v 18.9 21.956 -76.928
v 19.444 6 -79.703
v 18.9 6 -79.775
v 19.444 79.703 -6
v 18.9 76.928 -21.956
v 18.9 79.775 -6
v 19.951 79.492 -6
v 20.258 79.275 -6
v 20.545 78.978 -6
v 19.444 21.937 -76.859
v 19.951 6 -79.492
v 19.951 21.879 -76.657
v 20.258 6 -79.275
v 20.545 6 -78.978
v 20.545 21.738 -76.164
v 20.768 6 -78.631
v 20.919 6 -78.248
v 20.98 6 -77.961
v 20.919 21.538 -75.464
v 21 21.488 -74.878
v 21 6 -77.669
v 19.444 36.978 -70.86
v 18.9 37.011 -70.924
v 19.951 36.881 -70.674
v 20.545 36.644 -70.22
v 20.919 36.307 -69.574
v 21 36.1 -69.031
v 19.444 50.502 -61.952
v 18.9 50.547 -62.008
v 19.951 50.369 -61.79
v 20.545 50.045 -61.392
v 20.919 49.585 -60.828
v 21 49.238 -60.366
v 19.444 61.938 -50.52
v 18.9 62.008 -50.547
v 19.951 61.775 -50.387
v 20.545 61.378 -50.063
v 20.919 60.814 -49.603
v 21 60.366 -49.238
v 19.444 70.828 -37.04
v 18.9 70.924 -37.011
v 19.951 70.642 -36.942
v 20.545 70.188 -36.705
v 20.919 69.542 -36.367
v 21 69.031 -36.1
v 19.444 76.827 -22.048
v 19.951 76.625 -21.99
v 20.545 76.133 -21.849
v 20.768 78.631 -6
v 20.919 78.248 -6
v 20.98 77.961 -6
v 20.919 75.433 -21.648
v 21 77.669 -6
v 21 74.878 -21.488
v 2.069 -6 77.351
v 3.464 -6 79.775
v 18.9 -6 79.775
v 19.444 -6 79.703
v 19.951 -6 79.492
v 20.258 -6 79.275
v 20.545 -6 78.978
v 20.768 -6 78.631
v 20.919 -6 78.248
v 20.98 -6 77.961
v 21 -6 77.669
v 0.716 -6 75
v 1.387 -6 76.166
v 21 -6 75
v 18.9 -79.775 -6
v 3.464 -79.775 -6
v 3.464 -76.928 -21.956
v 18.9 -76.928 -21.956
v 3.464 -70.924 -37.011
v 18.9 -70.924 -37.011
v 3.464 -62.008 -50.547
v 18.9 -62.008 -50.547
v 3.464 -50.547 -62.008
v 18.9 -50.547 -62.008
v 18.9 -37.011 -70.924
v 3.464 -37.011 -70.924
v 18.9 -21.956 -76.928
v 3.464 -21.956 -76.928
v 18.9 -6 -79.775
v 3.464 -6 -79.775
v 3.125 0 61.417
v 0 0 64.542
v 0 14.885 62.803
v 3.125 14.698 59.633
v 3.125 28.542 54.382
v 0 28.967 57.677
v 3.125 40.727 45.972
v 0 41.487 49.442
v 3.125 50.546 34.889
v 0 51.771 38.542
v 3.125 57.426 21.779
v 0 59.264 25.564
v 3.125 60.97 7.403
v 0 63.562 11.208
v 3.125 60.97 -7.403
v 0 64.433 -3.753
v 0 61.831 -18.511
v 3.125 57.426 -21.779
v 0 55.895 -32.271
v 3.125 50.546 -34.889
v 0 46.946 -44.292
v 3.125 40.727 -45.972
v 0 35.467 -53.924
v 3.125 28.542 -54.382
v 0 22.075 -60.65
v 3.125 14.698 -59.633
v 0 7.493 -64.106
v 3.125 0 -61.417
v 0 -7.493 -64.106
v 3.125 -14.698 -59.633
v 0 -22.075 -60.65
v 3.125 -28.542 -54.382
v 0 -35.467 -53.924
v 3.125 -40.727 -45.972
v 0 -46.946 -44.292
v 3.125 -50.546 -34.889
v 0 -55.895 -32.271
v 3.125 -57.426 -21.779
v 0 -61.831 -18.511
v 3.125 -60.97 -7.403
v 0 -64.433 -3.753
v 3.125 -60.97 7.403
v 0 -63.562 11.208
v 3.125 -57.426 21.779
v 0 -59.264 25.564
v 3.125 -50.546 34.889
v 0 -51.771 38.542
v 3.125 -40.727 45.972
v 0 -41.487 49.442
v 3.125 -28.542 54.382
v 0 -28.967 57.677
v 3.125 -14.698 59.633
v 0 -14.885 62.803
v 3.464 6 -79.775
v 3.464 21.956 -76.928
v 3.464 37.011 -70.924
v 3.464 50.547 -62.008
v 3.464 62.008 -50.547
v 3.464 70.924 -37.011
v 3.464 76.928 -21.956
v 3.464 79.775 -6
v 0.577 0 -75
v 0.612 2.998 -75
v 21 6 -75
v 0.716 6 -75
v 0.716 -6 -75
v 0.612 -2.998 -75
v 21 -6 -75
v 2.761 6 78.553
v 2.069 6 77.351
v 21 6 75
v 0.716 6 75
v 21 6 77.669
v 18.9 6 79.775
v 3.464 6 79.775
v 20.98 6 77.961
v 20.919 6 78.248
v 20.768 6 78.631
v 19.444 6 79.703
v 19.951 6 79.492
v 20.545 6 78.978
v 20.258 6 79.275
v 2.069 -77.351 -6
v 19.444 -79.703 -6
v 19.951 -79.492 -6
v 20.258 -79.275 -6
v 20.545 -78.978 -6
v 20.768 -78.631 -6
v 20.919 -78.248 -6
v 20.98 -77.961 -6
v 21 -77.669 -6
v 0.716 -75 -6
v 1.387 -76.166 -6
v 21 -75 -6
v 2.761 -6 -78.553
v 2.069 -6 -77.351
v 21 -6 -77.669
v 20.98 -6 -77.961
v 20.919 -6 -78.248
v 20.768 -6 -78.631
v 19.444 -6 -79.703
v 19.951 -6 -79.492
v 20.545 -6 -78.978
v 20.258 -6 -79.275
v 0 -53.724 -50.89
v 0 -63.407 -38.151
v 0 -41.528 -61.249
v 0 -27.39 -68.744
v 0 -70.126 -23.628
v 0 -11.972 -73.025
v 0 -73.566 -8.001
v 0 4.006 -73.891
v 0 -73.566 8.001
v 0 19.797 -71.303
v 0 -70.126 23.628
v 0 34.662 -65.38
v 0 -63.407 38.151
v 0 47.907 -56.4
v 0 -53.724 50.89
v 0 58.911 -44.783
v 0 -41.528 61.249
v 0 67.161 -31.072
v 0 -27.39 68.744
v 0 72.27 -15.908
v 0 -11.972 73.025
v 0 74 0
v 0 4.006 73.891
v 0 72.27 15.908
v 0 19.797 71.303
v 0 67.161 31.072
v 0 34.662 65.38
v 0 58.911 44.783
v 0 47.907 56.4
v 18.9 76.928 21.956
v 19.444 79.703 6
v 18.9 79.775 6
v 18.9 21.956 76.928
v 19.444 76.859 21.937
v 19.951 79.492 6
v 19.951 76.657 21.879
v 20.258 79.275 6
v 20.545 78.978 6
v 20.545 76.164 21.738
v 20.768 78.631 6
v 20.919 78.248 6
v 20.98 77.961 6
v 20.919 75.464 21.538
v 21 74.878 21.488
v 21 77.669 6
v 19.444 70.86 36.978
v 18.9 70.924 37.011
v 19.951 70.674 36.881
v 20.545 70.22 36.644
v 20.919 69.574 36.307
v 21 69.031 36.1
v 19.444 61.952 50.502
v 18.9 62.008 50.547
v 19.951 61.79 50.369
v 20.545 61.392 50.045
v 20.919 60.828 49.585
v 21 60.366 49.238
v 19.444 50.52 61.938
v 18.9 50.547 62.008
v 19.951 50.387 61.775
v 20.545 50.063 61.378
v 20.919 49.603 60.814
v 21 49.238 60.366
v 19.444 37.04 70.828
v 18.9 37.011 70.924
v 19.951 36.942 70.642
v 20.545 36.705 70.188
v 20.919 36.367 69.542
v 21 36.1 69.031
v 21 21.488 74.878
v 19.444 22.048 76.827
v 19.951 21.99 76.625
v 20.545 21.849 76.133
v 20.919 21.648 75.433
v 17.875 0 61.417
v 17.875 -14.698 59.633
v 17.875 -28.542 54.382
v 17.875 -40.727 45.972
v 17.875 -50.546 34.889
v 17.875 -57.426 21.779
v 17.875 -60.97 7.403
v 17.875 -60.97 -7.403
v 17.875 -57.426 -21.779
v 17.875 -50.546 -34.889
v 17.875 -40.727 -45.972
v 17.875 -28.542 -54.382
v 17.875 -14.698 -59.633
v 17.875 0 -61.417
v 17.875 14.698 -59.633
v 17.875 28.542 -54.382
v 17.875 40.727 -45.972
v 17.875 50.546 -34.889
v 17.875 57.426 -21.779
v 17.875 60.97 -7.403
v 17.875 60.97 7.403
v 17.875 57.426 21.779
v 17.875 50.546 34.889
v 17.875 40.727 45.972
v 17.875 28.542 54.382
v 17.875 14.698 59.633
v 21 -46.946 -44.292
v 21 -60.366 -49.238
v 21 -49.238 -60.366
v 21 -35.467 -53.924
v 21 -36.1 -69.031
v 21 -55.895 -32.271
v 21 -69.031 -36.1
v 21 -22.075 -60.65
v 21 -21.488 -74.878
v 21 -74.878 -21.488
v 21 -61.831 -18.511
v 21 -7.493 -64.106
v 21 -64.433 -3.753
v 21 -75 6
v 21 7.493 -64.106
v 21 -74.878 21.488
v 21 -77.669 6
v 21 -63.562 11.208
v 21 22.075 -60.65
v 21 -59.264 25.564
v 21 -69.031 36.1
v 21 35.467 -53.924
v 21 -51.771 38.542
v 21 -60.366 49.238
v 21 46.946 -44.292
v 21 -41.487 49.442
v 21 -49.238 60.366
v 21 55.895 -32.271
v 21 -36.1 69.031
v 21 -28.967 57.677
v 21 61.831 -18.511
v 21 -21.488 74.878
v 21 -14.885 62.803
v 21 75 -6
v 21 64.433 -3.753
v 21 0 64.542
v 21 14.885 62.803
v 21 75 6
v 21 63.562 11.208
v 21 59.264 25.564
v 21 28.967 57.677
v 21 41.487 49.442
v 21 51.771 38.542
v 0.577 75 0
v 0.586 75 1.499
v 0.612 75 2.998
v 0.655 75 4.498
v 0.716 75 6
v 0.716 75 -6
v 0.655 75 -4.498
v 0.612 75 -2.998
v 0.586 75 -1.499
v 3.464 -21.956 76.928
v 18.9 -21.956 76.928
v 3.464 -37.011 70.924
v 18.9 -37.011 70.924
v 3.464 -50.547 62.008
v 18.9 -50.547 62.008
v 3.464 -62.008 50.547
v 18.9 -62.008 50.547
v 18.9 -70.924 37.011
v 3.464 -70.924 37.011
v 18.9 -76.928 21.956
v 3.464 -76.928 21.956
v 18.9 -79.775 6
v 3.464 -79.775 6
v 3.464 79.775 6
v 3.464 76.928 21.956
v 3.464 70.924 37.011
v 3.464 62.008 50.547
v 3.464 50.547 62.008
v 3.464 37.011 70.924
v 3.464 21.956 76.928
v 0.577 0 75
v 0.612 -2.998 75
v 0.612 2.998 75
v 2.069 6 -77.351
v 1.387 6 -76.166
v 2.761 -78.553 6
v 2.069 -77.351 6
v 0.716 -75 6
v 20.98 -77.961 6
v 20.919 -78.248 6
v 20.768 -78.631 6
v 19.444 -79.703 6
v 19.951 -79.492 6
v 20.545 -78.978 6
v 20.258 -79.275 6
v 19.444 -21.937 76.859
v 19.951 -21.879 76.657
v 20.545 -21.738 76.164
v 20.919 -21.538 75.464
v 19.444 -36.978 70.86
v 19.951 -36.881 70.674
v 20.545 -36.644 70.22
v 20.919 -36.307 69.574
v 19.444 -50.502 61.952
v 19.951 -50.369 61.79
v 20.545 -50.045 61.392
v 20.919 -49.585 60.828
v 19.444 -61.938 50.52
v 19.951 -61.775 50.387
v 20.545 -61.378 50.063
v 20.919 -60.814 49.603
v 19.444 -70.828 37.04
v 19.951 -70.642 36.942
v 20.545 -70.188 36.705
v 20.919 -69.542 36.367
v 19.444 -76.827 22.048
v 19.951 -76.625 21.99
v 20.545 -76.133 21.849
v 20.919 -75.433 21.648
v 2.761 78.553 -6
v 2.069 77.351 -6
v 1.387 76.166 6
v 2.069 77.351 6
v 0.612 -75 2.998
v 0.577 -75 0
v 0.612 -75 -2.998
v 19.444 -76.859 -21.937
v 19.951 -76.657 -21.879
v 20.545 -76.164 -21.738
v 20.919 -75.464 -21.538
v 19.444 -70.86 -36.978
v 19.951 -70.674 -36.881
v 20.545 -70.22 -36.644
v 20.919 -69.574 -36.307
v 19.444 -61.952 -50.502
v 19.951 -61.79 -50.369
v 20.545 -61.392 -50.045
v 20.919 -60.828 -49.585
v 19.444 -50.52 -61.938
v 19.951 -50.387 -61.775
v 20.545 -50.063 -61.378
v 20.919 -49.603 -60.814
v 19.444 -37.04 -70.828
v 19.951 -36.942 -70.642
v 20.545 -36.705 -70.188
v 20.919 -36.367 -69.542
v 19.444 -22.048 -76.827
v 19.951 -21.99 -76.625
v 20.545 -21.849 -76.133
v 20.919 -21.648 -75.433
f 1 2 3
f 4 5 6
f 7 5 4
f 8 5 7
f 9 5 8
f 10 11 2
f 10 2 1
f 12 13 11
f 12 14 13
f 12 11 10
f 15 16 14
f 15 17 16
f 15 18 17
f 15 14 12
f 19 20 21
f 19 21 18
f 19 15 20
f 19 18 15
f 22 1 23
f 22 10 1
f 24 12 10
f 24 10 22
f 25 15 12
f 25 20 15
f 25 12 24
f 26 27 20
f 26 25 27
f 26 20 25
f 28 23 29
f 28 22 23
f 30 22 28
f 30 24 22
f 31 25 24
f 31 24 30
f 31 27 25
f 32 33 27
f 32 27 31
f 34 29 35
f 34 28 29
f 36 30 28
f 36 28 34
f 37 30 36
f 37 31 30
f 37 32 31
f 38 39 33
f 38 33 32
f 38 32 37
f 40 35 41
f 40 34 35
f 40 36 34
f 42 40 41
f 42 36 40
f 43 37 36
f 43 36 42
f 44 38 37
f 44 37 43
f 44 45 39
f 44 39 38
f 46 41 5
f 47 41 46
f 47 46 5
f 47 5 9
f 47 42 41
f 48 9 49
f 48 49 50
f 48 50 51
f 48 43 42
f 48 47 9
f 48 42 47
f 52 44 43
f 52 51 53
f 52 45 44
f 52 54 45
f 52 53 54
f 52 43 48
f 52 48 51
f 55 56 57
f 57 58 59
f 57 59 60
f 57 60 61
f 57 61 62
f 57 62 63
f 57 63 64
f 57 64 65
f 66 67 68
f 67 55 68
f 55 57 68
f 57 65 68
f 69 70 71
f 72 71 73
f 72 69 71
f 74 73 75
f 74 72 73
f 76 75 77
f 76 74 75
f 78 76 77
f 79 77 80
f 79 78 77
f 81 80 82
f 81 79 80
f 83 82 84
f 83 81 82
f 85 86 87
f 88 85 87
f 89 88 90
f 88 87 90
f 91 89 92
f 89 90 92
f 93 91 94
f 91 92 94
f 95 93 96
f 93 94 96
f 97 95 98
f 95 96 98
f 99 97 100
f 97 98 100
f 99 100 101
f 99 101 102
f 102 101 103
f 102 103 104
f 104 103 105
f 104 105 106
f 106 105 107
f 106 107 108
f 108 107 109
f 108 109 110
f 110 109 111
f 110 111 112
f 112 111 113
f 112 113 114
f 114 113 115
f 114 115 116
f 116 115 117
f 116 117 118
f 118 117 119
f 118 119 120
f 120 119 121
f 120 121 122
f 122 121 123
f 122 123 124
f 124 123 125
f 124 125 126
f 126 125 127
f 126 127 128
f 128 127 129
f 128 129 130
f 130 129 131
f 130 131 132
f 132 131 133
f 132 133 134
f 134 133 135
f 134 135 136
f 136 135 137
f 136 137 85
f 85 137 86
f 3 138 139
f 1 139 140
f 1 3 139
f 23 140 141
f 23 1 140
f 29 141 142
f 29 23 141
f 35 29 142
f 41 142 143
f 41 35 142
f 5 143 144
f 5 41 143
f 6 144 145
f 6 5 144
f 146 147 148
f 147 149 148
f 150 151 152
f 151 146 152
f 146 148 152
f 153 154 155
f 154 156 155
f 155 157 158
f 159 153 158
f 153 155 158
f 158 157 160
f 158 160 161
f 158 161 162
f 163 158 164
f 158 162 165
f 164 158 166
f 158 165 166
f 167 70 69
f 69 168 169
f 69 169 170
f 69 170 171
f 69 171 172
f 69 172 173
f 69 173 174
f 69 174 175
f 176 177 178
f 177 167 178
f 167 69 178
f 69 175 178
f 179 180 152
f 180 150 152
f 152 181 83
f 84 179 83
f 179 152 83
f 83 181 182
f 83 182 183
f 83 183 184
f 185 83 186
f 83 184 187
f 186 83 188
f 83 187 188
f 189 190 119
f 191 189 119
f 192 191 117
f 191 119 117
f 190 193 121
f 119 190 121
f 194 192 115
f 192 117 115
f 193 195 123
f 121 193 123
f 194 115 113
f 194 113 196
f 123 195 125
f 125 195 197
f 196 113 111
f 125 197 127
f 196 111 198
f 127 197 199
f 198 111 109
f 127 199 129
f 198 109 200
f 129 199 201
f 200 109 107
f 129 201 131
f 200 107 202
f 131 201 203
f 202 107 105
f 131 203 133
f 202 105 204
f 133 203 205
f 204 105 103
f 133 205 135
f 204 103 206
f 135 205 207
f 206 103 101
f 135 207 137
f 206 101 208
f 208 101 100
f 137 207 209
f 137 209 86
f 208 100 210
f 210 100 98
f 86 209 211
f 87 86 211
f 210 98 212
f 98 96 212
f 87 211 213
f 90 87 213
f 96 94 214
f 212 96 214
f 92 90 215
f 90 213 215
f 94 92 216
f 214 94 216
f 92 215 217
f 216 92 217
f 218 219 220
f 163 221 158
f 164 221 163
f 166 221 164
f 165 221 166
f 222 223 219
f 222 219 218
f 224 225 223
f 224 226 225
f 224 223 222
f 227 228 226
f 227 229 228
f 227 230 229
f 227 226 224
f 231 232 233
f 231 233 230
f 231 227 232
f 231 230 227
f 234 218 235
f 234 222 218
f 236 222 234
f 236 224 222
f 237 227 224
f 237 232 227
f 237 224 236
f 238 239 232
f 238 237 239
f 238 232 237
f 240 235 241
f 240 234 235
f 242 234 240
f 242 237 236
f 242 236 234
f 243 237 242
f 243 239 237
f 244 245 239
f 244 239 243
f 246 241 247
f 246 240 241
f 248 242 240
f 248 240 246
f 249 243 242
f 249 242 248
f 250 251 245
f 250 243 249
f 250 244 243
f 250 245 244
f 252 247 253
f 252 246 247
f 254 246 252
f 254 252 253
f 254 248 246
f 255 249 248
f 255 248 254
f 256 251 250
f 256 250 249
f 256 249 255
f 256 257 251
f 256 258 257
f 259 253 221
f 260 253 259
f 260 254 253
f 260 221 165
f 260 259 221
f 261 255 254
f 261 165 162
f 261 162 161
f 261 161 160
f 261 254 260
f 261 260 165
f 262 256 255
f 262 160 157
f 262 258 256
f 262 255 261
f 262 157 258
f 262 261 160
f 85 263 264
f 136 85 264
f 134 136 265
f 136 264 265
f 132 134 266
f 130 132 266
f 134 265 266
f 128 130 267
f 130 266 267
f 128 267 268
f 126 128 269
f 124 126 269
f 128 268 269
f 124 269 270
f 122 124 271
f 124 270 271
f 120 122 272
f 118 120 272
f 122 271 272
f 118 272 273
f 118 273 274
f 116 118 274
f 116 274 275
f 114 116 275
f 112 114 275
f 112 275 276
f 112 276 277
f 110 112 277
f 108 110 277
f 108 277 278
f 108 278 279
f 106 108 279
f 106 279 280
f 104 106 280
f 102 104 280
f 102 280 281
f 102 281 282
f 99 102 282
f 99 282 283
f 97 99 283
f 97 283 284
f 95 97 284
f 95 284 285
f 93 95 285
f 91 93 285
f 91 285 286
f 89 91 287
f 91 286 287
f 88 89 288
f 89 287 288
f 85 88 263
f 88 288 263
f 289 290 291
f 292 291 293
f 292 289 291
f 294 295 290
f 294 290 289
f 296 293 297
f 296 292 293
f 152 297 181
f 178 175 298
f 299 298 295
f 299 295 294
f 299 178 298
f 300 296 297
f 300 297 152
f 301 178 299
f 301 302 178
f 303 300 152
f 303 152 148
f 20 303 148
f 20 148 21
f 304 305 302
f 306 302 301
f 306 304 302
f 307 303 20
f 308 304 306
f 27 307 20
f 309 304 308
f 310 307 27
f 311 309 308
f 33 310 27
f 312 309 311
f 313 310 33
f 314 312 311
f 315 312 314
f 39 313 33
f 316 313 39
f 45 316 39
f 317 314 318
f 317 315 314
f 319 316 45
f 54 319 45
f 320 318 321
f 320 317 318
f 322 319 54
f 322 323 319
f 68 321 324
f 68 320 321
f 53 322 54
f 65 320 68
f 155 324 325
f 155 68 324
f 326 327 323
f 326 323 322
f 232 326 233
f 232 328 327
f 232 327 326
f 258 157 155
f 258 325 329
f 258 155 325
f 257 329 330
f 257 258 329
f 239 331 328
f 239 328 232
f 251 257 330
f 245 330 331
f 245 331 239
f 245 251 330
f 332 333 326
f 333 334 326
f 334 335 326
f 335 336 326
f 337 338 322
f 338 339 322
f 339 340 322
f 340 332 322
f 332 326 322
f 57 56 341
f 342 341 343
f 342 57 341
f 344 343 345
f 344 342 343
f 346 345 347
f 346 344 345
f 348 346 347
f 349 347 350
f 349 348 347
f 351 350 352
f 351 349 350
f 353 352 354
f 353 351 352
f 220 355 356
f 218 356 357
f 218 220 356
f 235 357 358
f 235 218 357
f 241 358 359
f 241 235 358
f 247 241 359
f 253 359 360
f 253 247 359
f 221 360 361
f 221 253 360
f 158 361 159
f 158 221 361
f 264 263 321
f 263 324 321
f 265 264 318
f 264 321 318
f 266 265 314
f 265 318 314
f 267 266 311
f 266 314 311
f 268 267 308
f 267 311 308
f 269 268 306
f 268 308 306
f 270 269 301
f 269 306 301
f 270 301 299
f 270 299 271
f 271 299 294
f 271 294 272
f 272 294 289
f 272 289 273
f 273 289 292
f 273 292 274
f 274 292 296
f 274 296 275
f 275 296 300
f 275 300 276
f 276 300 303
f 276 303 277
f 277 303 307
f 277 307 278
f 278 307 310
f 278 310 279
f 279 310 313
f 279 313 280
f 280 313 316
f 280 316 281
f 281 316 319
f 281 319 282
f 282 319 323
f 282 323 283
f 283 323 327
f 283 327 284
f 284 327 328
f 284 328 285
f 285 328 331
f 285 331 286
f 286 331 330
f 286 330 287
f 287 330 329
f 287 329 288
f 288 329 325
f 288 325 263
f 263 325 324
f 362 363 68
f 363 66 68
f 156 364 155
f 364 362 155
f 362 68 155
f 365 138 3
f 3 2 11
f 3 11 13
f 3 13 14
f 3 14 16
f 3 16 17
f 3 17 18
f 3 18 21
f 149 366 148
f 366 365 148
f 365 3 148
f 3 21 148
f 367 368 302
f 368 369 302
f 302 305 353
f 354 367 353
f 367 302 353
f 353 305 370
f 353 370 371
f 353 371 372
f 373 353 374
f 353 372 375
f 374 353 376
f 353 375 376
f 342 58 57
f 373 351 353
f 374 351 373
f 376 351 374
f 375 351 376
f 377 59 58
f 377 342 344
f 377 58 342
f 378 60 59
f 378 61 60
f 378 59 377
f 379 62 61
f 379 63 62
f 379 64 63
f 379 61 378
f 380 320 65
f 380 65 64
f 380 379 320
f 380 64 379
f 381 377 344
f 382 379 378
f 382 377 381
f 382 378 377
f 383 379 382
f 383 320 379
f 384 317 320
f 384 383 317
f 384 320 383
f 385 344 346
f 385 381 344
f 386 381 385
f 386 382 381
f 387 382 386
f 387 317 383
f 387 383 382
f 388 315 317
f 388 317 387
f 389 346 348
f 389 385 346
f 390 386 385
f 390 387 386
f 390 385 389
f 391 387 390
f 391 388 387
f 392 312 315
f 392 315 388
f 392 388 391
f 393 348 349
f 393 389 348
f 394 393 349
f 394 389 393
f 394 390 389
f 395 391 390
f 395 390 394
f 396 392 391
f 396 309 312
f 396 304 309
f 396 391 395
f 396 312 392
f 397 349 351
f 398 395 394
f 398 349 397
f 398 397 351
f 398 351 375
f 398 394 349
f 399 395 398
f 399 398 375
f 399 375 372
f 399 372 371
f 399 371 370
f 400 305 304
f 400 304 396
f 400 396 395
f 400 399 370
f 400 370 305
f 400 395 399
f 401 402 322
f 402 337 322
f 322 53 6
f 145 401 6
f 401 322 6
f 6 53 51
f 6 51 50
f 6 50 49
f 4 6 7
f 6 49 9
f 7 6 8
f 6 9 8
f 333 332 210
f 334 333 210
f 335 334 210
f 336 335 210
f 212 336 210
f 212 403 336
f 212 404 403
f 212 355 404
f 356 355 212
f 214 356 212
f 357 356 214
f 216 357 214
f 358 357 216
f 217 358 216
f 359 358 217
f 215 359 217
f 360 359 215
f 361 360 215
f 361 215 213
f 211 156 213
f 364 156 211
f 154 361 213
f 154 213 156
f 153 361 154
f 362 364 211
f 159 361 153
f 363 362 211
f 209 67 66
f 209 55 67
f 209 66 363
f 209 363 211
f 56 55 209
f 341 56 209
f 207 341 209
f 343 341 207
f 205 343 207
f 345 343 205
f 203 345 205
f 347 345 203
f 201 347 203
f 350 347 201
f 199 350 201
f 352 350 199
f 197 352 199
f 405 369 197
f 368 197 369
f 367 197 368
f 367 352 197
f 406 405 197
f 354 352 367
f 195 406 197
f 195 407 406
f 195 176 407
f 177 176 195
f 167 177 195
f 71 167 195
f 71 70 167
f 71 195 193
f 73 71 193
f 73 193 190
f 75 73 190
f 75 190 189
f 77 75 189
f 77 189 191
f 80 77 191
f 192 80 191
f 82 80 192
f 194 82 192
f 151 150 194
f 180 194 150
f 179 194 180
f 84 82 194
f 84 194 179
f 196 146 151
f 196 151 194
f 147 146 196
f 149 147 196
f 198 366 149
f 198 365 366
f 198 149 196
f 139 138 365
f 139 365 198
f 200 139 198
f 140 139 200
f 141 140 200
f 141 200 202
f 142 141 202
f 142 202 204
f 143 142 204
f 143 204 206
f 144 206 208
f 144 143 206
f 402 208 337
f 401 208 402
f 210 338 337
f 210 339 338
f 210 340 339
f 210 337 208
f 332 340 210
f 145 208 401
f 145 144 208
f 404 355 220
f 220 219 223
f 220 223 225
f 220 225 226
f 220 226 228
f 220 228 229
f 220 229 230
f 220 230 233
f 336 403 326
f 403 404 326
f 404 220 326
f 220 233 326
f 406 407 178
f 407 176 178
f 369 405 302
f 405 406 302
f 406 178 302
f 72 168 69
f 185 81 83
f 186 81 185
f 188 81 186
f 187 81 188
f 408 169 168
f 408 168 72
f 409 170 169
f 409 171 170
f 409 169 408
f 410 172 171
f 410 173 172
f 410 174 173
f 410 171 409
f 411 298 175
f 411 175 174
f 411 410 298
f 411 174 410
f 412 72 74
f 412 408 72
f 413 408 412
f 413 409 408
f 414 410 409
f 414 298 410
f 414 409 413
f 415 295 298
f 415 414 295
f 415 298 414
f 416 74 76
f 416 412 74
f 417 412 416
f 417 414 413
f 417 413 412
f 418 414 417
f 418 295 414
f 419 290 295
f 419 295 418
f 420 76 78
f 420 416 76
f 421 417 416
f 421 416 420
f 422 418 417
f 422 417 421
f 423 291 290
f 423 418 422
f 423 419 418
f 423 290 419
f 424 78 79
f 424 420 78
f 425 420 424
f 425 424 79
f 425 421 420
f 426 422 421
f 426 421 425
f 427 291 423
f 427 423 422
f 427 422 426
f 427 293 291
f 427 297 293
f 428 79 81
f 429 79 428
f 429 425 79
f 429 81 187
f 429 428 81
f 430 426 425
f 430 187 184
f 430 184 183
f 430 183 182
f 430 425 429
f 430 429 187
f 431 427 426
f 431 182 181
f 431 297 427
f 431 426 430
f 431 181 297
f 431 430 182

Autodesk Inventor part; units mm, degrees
ref_plane "YZ Plane" through (0, 0, 0) normal (1, 0, 0) x (0, 1, 0)
ref_plane "XZ Plane" through (0, 0, 0) normal (0, 1, 0) x (-1, 0, 0)
sketch "Sketch1" plane through (0, 0, 0) normal (0, 0, 1) x (1, 0, 0)
  line L0 (0, 0) -> (21, 0)
  line L1 (0, 0) -> (0, 80)
  line L2 (0, 80) -> (21, 80)
  line L3 (21, 80) -> (21, 0)
  line L4 (0, 96) -> (0, -16) projected
  line L5 (-4.2, 0) -> (25.2, 0) projected
  dimension "d1" = 160
  dimension "d2" = 21
revolve "Body" add sketch "Sketch1" angle 360 about axis through (0, 0, 0) along (1, 0, 0)
sketch "Sketch2" plane through (0, 0, 0) normal (-1, 0, 0) x (0, 0, 1)
  circle A0 centre (0, 0) radius 80 projected
  point P0 (0, 0)
hole "Thread" at (0, 0, 0) direction (1, 0, 0) diameter 122.8349 end through all thread size "M125x2" class "6H" standard "ISO Metric profile"
chamfer "Chamfer1" distance 6 angle 30 1 edges at (0, -80, 0) measured on face at (0, -39.8141, -61.8966)
sketch "Sketch3" plane through (21, 0, 0) normal (1, 0, 0) x (0, 0, -1)
  circle A0 centre (0, 0) radius 80 projected
  line L0 (-6, 79.7747) -> (-6, 75)
  line L1 (-6, 75) -> (6, 75)
  line L2 (6, 75) -> (6, 79.7747)
  line L3 (0, -112) -> (0, 112) projected
  line L4 (-112, 0) -> (112, 0) projected
  dimension "d12" = 6
  dimension "d13" = 6
  dimension "d14" = 75
extrude "Groove1" cut sketch "Sketch3" against normal through all contours L2 L1 L3 A0 | L3 L1 L0 A0
pattern_circular "Grooves1" count 4 over 360 about axis through (-10, 0, 0) along (1, 0, 0) of "Groove1"
fillet "Fillet1" radius 2.1 4 edges at (21, 56.5685, 56.5685) (21, 56.5685, -56.5685) (21, -56.5685, -56.5685) (21, -56.5685, 56.5685)
chamfer "Chamfer2" distance 3.125 angle 45 1 edges at (21, 0, -61.4175) measured on face at (21, -40.9181, 59.4692)
chamfer "Chamfer3" distance 3.125 angle 45 1 edges at (0, 0, -61.4175) measured on face at (0, 64.709, 25.6007)
ref_plane "Work Plane1" through (227.2466, 0, 0) normal (0, 1, 0) x (-1, 0, 0)
equation "\"d1\" = SD2"
equation "\"d2\" = KOH"
equation "\"d12\" = 0.5 * SNB"
equation "\"d13\" = 0.5 * SNB"
equation "\"d14\" = 0.5 * SD2 - SNT"
equation "\"d10\" = -0.5 * LADI + 0.5 * SD2"
equation "\"d11\" = FAWI2"
equation "\"d40\" = -0.5 * LADI + 0.5 * SD2"
equation "\"d18\" = RR"
equation "\"d19\" = 0.025 * NND"
equation "\"d41\" = 0.025 * NND"
equation "\"d21\" = 0.025 * NND"
equation "\"d42\" = 0.025 * NND"
equation "\"NND\" = 125"
equation "\"KOH\" = 21"
equation "\"SD2\" = 160"
equation "\"SNB\" = 12"
equation "\"SNT\" = 5"
equation "\"LADI\" = 148"
equation "\"RR\" = 2.1"
equation "\"FAWI2\" = 30deg"
equation "\"GUL\" = 0.61345 * PTC"
equation "\"THREADDIA\" = 125"
equation "\"TOA\" = 30deg"
equation "\"PTC\" = 2"
equation "\"GAL\" = 0.61345 * PTC"
equation "\"GD1\" = THREADDIA - 1.2269 * PTC"
properties part number "DIN 981 - KM 25" material "Steel, Mild"
